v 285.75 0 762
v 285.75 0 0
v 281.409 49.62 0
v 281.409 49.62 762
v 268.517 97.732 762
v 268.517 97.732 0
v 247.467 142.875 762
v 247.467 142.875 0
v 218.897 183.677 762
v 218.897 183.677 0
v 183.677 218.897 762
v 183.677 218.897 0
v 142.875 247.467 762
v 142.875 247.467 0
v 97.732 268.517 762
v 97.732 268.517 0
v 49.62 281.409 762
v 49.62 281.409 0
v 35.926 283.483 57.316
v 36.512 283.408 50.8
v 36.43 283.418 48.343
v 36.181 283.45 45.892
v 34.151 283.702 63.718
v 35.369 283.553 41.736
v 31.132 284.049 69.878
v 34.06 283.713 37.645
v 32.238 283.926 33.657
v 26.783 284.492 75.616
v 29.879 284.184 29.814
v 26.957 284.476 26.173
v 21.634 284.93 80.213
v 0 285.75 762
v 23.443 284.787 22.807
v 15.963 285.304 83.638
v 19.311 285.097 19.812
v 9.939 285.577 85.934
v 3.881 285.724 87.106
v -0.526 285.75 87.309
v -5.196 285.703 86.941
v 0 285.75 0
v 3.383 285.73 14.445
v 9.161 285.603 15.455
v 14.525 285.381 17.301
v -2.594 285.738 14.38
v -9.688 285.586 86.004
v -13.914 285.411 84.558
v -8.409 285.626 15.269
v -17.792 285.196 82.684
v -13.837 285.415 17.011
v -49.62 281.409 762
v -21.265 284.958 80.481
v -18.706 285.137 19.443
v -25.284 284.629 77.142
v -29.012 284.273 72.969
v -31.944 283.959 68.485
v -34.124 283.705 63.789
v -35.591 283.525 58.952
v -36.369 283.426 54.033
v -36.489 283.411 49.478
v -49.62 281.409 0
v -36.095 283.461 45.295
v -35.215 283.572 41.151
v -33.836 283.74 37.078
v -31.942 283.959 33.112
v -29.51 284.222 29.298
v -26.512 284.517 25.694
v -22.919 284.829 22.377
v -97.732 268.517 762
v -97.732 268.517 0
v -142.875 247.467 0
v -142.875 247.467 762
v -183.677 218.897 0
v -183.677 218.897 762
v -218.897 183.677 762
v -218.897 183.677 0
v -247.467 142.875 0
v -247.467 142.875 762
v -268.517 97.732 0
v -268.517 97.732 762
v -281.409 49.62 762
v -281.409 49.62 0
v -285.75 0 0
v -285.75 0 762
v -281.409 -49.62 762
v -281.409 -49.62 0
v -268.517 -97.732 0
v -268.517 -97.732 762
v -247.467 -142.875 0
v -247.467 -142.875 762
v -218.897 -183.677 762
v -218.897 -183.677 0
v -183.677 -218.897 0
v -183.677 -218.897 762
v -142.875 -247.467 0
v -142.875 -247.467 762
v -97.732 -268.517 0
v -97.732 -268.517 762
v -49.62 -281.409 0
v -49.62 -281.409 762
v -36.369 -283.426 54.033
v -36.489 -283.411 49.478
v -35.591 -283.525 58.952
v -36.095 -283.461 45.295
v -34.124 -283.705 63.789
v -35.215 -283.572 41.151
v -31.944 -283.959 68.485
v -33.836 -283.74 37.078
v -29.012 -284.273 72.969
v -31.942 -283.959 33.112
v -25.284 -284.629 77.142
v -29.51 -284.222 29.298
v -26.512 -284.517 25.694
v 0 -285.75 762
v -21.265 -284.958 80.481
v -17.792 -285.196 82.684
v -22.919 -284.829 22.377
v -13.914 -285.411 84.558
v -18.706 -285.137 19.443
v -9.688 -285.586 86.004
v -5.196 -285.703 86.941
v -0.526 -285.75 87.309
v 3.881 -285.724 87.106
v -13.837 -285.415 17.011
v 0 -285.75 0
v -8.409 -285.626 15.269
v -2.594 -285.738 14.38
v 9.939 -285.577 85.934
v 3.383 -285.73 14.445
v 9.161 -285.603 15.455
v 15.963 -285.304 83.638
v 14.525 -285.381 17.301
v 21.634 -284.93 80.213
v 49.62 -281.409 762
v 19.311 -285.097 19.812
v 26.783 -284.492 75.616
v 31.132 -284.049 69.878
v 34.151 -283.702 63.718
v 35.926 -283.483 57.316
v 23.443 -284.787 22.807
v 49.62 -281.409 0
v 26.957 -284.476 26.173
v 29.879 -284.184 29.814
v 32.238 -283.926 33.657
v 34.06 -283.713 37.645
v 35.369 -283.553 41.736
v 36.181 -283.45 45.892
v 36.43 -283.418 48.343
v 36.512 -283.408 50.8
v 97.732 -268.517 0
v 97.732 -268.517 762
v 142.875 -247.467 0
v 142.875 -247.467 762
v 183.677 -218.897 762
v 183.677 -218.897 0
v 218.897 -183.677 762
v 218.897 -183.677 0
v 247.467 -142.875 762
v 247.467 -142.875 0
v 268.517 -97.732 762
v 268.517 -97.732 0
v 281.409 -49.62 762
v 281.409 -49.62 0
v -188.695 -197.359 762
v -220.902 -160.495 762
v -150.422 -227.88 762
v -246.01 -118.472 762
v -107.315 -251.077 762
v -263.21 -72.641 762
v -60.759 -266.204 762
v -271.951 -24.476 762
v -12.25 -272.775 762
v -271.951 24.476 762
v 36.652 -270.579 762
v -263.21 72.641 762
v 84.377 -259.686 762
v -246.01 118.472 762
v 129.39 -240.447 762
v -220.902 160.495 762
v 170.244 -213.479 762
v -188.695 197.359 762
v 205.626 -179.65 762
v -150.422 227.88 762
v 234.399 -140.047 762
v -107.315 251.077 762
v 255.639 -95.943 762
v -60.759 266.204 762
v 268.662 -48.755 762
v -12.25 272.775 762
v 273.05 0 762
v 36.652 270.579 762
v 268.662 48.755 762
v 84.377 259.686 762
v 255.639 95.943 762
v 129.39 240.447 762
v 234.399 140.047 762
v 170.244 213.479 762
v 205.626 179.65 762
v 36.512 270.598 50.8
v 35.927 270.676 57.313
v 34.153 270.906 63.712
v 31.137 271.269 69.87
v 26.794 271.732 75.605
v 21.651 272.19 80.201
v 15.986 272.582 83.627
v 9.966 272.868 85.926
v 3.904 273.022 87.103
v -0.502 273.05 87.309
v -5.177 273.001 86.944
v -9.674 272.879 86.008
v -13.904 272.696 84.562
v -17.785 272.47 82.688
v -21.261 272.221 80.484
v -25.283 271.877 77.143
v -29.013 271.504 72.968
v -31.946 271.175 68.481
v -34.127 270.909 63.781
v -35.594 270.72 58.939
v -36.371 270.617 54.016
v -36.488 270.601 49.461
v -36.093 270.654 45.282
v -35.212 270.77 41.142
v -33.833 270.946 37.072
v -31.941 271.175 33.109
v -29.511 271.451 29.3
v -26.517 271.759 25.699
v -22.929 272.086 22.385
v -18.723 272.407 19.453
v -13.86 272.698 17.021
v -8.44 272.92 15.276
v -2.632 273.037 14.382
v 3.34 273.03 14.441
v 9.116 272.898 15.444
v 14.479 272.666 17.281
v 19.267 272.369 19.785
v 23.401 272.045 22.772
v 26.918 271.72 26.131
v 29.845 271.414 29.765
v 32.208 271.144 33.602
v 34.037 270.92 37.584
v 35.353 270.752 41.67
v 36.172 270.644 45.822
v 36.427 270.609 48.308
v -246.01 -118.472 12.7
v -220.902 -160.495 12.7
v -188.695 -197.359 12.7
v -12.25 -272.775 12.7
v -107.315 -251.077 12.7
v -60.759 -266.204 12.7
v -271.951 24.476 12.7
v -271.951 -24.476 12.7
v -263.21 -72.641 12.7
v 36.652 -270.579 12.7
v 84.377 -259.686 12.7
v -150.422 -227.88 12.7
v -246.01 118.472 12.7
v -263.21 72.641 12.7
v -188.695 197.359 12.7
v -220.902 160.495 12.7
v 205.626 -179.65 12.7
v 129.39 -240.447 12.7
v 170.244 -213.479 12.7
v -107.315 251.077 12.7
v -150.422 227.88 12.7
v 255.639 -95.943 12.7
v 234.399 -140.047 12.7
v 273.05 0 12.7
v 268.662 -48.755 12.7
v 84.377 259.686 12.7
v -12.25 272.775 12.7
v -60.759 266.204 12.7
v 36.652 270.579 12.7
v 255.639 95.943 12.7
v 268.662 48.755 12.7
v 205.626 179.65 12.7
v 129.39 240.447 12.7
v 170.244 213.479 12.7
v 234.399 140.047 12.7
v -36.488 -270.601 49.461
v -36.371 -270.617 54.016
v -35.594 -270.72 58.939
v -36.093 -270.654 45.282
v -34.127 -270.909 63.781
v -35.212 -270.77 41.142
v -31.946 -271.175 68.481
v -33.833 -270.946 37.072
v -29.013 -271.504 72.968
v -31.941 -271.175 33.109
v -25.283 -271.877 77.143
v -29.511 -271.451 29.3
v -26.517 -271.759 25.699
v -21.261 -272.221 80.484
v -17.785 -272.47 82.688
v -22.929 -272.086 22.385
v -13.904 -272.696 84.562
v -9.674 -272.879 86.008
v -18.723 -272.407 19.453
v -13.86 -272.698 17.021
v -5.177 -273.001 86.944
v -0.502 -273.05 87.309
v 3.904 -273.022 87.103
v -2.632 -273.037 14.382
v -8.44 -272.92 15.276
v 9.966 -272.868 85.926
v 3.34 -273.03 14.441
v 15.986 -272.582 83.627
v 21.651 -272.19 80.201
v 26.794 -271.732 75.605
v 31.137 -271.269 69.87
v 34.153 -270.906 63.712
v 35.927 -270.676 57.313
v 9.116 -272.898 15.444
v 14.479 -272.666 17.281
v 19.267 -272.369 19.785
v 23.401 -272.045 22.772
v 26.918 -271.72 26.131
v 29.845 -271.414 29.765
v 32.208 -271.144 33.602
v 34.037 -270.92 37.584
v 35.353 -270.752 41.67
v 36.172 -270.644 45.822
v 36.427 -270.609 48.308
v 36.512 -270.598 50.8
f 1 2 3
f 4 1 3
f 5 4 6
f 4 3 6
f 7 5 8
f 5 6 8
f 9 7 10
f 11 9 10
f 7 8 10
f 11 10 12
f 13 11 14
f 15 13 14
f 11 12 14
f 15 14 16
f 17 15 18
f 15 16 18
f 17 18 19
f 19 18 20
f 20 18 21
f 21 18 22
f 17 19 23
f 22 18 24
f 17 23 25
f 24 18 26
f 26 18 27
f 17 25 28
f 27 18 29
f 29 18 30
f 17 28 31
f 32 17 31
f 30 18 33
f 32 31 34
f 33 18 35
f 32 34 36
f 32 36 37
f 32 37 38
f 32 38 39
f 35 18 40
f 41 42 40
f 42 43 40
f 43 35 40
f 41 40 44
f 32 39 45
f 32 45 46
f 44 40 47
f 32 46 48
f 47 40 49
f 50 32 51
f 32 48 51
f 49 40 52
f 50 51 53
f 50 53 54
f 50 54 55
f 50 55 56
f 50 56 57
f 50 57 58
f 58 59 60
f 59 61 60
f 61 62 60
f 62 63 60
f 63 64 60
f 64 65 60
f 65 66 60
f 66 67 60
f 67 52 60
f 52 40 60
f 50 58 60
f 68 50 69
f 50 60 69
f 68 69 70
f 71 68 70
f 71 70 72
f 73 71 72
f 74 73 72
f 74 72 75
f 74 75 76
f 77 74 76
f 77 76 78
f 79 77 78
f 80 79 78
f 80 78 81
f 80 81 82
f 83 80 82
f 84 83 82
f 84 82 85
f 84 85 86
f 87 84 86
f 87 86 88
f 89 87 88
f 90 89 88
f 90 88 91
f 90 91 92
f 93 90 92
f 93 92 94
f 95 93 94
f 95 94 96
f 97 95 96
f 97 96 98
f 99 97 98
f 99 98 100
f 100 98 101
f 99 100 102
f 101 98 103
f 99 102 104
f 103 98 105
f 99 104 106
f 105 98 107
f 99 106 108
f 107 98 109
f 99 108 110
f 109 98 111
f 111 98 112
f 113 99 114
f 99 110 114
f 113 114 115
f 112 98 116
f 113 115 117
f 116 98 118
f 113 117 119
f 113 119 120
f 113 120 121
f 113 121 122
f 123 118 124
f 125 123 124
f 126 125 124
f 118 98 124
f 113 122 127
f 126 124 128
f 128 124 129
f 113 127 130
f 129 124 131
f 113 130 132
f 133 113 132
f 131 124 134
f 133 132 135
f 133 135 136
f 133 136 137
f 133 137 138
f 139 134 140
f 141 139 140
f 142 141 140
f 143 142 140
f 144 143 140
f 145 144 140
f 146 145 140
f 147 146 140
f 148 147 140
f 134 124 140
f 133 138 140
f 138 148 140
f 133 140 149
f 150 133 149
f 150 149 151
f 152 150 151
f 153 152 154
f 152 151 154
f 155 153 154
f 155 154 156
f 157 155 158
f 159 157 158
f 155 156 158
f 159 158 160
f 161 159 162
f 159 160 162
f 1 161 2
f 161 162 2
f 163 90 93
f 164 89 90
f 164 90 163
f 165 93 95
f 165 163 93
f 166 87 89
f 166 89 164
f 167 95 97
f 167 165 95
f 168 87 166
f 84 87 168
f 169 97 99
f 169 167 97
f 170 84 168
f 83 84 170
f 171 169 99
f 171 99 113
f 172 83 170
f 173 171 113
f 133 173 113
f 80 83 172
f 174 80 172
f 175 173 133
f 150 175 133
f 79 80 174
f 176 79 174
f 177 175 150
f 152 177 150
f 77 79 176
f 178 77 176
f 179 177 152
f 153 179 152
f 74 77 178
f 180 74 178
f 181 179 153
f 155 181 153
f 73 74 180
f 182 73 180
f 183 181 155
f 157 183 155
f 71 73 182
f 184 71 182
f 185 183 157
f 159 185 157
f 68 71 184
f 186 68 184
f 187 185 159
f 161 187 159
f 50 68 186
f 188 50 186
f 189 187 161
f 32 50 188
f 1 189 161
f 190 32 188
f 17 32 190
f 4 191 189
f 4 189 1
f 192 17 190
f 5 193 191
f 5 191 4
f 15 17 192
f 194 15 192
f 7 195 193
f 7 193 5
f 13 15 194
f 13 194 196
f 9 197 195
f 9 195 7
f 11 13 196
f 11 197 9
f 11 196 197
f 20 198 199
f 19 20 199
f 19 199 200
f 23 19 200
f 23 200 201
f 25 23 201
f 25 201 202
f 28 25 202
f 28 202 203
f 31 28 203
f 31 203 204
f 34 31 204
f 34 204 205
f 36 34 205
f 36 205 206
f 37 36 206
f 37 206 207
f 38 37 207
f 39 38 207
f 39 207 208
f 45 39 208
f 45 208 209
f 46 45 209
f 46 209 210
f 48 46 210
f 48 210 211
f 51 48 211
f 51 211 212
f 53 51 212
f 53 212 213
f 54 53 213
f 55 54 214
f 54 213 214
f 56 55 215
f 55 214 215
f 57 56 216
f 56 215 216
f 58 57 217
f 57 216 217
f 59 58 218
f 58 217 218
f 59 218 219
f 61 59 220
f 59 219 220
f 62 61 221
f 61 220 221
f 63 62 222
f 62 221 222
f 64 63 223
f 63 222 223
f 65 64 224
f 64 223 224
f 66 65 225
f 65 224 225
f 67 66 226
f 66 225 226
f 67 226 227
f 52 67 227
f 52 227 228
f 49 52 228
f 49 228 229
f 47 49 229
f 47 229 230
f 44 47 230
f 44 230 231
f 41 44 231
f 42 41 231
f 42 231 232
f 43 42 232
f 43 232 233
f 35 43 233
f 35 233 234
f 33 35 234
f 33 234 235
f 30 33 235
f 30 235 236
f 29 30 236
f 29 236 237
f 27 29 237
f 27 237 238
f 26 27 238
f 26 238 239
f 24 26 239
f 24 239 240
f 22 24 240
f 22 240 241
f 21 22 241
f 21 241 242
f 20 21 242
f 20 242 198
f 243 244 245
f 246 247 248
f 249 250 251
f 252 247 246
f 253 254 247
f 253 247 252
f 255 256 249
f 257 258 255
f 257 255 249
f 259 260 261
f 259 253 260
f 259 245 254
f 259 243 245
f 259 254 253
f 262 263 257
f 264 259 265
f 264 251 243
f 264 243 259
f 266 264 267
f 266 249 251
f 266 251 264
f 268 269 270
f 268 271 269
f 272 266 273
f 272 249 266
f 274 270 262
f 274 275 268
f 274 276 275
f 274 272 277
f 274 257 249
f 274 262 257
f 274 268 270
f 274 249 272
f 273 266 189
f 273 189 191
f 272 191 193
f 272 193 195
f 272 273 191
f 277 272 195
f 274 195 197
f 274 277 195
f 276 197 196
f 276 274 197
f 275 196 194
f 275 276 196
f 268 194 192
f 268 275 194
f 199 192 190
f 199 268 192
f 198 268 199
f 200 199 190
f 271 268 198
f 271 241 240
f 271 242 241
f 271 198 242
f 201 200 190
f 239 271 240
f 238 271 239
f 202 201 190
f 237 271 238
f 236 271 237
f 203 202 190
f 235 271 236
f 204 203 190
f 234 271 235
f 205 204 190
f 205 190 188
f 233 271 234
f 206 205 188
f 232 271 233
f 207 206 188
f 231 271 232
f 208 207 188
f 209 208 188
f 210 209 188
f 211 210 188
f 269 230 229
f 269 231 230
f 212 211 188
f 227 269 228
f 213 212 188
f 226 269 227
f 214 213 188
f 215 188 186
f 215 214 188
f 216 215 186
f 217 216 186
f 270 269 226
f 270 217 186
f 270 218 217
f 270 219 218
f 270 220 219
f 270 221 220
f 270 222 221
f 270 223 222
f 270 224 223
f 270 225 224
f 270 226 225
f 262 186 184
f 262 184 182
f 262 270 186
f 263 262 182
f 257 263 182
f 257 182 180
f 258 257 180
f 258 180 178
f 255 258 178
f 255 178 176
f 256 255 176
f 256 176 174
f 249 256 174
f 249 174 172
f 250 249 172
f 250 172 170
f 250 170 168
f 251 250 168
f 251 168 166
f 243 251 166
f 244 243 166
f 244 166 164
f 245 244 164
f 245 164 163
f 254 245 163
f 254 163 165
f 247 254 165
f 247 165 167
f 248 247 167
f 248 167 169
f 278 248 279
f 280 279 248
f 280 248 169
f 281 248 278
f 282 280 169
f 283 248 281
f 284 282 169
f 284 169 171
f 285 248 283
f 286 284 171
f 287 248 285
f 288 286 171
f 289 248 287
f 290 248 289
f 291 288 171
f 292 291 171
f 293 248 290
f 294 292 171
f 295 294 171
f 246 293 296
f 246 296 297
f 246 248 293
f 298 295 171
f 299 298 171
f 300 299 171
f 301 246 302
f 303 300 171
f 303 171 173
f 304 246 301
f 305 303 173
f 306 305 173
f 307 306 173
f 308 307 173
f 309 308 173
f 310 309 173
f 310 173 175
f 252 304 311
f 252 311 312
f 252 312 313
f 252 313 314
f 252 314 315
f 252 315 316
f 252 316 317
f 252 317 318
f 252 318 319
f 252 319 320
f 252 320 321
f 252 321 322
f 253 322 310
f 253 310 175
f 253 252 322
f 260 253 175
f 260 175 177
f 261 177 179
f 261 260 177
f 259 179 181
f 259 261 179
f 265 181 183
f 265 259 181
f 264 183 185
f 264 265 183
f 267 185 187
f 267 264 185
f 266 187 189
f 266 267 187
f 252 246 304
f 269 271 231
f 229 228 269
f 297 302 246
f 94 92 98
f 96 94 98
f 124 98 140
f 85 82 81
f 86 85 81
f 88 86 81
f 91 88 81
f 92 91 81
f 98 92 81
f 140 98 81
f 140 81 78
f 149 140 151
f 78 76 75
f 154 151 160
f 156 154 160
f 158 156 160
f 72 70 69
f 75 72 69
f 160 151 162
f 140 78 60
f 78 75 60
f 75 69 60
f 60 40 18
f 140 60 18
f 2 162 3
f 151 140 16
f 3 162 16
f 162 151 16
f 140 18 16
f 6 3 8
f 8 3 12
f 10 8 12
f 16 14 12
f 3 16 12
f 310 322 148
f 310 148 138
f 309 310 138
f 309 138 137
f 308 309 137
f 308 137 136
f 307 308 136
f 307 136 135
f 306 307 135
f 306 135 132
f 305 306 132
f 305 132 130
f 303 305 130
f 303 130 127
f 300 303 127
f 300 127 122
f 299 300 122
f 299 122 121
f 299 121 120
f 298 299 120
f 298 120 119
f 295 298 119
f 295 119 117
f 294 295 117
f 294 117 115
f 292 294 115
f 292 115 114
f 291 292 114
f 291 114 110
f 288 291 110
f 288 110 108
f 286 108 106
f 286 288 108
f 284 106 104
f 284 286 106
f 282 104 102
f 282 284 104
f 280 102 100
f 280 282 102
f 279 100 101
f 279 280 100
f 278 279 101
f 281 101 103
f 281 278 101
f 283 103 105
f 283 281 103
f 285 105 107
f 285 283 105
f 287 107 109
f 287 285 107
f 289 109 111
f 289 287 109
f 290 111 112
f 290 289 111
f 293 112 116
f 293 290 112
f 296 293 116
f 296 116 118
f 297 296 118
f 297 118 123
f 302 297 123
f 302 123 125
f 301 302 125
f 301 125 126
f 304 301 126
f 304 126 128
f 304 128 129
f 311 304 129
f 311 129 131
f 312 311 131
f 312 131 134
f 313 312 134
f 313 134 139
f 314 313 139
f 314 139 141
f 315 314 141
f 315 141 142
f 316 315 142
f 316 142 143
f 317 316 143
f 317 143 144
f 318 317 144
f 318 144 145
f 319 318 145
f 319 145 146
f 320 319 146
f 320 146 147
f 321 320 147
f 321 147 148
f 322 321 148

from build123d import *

# Parameters (mm, degrees)
F0_R     = 285.75
F1_DEPTH = 762
F2_T     = -12.7
F3_R     = 36.5125
F4_DEPTH = 327.66
F5_R     = 36.5125
F6_DEPTH = 345.44


with BuildPart() as f1:
    # F0 (on Top) → F1 (new body)
    with BuildSketch(Plane.XY):
        Circle(F0_R)
    extrude(amount=F1_DEPTH)

    # F2
    f2_openings = [f1.faces().sort_by_distance(p)[0] for p in [
        (0, 0, 762),
    ]]
    offset(amount=F2_T, openings=f2_openings)

    # F3 (on Front) → F4 (cut)
    with BuildSketch(Plane.XZ):
        with Locations((0, 50.8)):
            Circle(F3_R)
    extrude(amount=F4_DEPTH, mode=Mode.SUBTRACT)

    # F5 (on Front) → F6 (cut)
    with BuildSketch(Plane.XZ):
        with Locations((0, 50.8)):
            Circle(F5_R)
    extrude(amount=-F6_DEPTH, mode=Mode.SUBTRACT)


solid = f1.part
